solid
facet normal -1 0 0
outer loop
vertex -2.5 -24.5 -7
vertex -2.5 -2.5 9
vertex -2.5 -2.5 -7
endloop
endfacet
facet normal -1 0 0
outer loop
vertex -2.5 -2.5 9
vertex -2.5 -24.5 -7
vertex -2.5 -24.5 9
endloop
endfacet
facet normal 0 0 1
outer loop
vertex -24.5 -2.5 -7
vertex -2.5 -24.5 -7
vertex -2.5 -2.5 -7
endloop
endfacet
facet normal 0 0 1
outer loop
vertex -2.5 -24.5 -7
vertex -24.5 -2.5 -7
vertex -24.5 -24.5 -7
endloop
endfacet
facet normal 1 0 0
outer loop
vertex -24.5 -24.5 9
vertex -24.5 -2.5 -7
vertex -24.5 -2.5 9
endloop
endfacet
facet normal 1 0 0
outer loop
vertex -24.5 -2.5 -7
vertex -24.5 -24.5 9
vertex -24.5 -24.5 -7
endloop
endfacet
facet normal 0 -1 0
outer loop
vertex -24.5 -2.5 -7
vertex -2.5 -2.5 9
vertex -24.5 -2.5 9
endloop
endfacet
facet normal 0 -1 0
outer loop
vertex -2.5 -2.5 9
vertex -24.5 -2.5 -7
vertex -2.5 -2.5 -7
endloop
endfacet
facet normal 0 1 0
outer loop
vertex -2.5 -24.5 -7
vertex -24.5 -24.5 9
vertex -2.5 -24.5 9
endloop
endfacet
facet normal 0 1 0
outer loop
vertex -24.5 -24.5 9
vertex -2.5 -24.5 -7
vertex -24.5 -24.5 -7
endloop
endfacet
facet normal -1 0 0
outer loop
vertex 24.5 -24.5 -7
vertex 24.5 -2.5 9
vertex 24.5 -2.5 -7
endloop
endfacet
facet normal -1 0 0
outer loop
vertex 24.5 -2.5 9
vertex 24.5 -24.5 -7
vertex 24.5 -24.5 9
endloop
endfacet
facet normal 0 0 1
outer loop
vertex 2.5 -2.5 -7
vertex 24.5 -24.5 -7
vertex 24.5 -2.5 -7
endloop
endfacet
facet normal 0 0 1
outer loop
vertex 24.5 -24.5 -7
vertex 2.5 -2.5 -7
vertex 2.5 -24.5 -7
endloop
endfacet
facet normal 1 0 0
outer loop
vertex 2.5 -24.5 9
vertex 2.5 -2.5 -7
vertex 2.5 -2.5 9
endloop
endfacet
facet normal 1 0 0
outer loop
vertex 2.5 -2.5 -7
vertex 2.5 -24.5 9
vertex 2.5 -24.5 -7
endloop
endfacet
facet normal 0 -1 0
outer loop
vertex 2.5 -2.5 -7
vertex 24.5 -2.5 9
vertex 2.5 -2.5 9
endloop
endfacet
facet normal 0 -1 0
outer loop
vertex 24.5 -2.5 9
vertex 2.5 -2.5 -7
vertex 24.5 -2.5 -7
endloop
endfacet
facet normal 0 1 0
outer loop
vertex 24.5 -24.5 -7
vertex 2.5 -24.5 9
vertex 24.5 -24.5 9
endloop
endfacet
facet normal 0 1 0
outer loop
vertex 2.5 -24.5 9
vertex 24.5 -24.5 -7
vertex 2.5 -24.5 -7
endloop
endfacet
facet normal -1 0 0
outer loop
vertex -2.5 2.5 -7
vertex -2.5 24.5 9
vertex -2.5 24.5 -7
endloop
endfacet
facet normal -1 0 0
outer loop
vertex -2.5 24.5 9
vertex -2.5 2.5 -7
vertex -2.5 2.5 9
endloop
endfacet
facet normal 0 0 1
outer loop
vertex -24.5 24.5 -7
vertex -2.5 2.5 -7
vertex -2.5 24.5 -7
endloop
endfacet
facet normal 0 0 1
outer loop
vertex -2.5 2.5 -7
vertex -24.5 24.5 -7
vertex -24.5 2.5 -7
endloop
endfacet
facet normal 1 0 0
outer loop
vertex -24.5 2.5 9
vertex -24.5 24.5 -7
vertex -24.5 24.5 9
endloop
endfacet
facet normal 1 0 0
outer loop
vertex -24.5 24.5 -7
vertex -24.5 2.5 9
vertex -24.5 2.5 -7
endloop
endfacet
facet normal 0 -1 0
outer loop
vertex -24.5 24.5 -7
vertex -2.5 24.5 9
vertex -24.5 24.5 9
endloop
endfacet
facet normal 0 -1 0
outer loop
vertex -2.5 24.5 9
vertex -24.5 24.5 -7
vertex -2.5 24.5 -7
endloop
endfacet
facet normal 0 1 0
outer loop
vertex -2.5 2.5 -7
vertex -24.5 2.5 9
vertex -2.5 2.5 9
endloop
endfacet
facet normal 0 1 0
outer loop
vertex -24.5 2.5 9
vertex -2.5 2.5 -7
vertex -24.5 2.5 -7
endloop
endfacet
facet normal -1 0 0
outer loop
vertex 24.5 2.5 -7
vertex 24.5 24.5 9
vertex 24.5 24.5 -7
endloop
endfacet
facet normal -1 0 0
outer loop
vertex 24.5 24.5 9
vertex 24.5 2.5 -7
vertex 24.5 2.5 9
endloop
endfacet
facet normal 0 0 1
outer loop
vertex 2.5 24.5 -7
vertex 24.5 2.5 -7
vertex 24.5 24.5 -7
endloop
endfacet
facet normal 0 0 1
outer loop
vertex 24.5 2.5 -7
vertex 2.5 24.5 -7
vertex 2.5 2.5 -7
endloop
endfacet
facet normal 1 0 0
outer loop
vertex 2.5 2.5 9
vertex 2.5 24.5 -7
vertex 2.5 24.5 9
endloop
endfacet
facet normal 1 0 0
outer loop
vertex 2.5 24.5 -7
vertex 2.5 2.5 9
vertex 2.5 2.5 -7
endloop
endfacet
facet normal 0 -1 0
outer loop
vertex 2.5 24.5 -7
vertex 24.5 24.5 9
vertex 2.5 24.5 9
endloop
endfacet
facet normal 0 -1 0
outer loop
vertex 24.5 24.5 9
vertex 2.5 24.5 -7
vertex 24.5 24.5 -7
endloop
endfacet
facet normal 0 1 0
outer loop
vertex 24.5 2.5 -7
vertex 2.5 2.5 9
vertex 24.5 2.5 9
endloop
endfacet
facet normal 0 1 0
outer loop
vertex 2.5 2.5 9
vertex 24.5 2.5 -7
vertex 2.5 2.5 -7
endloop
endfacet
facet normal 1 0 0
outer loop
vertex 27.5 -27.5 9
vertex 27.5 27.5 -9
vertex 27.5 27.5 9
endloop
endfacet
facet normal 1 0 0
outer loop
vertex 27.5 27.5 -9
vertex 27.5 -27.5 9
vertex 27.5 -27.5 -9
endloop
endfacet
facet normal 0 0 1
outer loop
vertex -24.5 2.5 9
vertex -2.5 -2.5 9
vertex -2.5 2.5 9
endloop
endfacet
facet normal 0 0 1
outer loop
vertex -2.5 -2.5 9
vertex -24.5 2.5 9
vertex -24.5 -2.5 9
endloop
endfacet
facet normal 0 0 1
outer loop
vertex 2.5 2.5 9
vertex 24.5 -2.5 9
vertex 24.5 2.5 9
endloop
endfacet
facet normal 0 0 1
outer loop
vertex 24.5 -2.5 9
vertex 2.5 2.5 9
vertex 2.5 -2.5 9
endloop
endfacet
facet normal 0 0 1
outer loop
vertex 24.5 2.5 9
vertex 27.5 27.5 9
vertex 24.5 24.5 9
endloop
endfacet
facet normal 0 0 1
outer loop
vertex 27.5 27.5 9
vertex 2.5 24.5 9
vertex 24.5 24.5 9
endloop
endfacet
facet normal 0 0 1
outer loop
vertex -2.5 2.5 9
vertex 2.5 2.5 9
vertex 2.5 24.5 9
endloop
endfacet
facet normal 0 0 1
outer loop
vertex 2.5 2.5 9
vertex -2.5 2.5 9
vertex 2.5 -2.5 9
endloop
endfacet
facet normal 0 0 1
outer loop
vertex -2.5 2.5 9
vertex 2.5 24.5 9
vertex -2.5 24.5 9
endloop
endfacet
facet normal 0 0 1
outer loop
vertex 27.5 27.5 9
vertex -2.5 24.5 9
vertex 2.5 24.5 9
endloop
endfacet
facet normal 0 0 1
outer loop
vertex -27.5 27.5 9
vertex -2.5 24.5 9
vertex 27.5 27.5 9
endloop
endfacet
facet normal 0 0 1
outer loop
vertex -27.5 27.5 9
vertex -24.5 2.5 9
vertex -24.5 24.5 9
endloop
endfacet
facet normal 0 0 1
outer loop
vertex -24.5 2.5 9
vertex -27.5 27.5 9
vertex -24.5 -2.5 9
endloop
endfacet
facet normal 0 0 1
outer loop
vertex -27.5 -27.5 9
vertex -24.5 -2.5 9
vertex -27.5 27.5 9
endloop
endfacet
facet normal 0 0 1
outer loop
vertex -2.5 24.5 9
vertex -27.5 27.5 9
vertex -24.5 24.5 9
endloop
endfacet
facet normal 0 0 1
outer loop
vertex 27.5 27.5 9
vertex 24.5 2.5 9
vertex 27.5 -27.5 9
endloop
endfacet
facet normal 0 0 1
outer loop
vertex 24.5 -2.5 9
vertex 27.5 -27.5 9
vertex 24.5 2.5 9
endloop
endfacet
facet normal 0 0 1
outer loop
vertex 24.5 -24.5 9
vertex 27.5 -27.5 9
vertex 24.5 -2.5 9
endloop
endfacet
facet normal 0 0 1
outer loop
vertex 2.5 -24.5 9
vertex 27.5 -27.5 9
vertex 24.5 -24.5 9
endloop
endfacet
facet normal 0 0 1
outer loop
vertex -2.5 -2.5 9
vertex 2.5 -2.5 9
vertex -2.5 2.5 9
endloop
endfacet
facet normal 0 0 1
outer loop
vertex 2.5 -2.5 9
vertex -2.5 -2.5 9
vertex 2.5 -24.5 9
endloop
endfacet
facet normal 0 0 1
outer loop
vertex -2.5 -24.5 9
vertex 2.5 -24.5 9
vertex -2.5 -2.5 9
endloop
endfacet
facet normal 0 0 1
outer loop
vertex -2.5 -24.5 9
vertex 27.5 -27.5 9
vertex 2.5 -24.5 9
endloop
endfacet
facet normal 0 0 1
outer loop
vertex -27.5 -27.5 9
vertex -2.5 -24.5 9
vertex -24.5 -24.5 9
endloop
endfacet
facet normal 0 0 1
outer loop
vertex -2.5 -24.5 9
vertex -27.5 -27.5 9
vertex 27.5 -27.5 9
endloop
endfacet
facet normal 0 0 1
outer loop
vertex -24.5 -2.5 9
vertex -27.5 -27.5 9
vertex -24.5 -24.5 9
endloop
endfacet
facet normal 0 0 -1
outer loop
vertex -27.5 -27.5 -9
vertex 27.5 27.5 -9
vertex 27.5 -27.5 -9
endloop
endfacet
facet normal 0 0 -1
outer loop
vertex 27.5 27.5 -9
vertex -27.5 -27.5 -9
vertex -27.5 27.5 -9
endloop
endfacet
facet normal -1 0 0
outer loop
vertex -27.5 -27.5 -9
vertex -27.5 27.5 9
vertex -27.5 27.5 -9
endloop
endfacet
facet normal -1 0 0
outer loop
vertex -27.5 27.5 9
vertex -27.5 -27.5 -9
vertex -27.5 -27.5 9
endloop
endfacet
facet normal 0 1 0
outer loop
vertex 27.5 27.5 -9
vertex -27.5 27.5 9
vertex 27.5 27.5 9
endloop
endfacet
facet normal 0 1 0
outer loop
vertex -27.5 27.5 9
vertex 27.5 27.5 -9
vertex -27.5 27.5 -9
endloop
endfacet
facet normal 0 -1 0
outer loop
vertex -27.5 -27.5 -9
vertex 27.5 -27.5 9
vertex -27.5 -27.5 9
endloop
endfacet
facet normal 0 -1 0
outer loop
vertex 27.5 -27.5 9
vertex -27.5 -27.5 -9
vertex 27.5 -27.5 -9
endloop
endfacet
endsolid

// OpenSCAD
$fn = 32;

// ----------------------------------------------------------------------
// Pocket plate 55 x 55 x 18
// 2 x 2 pockets 22 mm square, 16 mm deep
// ----------------------------------------------------------------------

// --- parameters (mm) ---
thickness = 18;  // plate thickness
floor_t = 2;     // material left under each pocket
pocket = 22;     // pocket side length
pitch_x = 27;    // pocket pitch along X
pitch_y = 27;    // pocket pitch along Y
cols = 2;        // pockets per row
rows = 2;        // rows of pockets

// --- derived feature positions (mm) ---
depth = thickness - floor_t;        // = 16   pocket depth, down to the floor
span_x = (cols - 1) * pitch_x;      // = 27   distance between outer pockets
span_y = (rows - 1) * pitch_y;      // = 27   distance between outer pocket rows
origin_x = -span_x / 2;             // = -13.5   X of the first pocket
origin_y = -span_y / 2;             // = -13.5   Y of the first pocket
plate = [span_x + pocket + 6, span_y + pocket + 6, thickness];  // = [55, 55, 18]   overall size: pockets plus 3 mm of wall on each side
feature_centers = [
  [origin_x + 0 * pitch_x, origin_y + 0 * pitch_y],
  [origin_x + 1 * pitch_x, origin_y + 0 * pitch_y],
  [origin_x + 0 * pitch_x, origin_y + 1 * pitch_y],
  [origin_x + 1 * pitch_x, origin_y + 1 * pitch_y]
];   // pocket centres, used verbatim by the cutter loop

// plate outline, then one pocket per centre in feature_centers
difference() {
  cube(plate, center = true);
  for (centre = feature_centers)
    translate([centre[0] - pocket / 2, centre[1] - pocket / 2, plate[2] / 2 - depth])
      cube([pocket, pocket, depth + 1]);  // centred on the declared pocket centre
}
